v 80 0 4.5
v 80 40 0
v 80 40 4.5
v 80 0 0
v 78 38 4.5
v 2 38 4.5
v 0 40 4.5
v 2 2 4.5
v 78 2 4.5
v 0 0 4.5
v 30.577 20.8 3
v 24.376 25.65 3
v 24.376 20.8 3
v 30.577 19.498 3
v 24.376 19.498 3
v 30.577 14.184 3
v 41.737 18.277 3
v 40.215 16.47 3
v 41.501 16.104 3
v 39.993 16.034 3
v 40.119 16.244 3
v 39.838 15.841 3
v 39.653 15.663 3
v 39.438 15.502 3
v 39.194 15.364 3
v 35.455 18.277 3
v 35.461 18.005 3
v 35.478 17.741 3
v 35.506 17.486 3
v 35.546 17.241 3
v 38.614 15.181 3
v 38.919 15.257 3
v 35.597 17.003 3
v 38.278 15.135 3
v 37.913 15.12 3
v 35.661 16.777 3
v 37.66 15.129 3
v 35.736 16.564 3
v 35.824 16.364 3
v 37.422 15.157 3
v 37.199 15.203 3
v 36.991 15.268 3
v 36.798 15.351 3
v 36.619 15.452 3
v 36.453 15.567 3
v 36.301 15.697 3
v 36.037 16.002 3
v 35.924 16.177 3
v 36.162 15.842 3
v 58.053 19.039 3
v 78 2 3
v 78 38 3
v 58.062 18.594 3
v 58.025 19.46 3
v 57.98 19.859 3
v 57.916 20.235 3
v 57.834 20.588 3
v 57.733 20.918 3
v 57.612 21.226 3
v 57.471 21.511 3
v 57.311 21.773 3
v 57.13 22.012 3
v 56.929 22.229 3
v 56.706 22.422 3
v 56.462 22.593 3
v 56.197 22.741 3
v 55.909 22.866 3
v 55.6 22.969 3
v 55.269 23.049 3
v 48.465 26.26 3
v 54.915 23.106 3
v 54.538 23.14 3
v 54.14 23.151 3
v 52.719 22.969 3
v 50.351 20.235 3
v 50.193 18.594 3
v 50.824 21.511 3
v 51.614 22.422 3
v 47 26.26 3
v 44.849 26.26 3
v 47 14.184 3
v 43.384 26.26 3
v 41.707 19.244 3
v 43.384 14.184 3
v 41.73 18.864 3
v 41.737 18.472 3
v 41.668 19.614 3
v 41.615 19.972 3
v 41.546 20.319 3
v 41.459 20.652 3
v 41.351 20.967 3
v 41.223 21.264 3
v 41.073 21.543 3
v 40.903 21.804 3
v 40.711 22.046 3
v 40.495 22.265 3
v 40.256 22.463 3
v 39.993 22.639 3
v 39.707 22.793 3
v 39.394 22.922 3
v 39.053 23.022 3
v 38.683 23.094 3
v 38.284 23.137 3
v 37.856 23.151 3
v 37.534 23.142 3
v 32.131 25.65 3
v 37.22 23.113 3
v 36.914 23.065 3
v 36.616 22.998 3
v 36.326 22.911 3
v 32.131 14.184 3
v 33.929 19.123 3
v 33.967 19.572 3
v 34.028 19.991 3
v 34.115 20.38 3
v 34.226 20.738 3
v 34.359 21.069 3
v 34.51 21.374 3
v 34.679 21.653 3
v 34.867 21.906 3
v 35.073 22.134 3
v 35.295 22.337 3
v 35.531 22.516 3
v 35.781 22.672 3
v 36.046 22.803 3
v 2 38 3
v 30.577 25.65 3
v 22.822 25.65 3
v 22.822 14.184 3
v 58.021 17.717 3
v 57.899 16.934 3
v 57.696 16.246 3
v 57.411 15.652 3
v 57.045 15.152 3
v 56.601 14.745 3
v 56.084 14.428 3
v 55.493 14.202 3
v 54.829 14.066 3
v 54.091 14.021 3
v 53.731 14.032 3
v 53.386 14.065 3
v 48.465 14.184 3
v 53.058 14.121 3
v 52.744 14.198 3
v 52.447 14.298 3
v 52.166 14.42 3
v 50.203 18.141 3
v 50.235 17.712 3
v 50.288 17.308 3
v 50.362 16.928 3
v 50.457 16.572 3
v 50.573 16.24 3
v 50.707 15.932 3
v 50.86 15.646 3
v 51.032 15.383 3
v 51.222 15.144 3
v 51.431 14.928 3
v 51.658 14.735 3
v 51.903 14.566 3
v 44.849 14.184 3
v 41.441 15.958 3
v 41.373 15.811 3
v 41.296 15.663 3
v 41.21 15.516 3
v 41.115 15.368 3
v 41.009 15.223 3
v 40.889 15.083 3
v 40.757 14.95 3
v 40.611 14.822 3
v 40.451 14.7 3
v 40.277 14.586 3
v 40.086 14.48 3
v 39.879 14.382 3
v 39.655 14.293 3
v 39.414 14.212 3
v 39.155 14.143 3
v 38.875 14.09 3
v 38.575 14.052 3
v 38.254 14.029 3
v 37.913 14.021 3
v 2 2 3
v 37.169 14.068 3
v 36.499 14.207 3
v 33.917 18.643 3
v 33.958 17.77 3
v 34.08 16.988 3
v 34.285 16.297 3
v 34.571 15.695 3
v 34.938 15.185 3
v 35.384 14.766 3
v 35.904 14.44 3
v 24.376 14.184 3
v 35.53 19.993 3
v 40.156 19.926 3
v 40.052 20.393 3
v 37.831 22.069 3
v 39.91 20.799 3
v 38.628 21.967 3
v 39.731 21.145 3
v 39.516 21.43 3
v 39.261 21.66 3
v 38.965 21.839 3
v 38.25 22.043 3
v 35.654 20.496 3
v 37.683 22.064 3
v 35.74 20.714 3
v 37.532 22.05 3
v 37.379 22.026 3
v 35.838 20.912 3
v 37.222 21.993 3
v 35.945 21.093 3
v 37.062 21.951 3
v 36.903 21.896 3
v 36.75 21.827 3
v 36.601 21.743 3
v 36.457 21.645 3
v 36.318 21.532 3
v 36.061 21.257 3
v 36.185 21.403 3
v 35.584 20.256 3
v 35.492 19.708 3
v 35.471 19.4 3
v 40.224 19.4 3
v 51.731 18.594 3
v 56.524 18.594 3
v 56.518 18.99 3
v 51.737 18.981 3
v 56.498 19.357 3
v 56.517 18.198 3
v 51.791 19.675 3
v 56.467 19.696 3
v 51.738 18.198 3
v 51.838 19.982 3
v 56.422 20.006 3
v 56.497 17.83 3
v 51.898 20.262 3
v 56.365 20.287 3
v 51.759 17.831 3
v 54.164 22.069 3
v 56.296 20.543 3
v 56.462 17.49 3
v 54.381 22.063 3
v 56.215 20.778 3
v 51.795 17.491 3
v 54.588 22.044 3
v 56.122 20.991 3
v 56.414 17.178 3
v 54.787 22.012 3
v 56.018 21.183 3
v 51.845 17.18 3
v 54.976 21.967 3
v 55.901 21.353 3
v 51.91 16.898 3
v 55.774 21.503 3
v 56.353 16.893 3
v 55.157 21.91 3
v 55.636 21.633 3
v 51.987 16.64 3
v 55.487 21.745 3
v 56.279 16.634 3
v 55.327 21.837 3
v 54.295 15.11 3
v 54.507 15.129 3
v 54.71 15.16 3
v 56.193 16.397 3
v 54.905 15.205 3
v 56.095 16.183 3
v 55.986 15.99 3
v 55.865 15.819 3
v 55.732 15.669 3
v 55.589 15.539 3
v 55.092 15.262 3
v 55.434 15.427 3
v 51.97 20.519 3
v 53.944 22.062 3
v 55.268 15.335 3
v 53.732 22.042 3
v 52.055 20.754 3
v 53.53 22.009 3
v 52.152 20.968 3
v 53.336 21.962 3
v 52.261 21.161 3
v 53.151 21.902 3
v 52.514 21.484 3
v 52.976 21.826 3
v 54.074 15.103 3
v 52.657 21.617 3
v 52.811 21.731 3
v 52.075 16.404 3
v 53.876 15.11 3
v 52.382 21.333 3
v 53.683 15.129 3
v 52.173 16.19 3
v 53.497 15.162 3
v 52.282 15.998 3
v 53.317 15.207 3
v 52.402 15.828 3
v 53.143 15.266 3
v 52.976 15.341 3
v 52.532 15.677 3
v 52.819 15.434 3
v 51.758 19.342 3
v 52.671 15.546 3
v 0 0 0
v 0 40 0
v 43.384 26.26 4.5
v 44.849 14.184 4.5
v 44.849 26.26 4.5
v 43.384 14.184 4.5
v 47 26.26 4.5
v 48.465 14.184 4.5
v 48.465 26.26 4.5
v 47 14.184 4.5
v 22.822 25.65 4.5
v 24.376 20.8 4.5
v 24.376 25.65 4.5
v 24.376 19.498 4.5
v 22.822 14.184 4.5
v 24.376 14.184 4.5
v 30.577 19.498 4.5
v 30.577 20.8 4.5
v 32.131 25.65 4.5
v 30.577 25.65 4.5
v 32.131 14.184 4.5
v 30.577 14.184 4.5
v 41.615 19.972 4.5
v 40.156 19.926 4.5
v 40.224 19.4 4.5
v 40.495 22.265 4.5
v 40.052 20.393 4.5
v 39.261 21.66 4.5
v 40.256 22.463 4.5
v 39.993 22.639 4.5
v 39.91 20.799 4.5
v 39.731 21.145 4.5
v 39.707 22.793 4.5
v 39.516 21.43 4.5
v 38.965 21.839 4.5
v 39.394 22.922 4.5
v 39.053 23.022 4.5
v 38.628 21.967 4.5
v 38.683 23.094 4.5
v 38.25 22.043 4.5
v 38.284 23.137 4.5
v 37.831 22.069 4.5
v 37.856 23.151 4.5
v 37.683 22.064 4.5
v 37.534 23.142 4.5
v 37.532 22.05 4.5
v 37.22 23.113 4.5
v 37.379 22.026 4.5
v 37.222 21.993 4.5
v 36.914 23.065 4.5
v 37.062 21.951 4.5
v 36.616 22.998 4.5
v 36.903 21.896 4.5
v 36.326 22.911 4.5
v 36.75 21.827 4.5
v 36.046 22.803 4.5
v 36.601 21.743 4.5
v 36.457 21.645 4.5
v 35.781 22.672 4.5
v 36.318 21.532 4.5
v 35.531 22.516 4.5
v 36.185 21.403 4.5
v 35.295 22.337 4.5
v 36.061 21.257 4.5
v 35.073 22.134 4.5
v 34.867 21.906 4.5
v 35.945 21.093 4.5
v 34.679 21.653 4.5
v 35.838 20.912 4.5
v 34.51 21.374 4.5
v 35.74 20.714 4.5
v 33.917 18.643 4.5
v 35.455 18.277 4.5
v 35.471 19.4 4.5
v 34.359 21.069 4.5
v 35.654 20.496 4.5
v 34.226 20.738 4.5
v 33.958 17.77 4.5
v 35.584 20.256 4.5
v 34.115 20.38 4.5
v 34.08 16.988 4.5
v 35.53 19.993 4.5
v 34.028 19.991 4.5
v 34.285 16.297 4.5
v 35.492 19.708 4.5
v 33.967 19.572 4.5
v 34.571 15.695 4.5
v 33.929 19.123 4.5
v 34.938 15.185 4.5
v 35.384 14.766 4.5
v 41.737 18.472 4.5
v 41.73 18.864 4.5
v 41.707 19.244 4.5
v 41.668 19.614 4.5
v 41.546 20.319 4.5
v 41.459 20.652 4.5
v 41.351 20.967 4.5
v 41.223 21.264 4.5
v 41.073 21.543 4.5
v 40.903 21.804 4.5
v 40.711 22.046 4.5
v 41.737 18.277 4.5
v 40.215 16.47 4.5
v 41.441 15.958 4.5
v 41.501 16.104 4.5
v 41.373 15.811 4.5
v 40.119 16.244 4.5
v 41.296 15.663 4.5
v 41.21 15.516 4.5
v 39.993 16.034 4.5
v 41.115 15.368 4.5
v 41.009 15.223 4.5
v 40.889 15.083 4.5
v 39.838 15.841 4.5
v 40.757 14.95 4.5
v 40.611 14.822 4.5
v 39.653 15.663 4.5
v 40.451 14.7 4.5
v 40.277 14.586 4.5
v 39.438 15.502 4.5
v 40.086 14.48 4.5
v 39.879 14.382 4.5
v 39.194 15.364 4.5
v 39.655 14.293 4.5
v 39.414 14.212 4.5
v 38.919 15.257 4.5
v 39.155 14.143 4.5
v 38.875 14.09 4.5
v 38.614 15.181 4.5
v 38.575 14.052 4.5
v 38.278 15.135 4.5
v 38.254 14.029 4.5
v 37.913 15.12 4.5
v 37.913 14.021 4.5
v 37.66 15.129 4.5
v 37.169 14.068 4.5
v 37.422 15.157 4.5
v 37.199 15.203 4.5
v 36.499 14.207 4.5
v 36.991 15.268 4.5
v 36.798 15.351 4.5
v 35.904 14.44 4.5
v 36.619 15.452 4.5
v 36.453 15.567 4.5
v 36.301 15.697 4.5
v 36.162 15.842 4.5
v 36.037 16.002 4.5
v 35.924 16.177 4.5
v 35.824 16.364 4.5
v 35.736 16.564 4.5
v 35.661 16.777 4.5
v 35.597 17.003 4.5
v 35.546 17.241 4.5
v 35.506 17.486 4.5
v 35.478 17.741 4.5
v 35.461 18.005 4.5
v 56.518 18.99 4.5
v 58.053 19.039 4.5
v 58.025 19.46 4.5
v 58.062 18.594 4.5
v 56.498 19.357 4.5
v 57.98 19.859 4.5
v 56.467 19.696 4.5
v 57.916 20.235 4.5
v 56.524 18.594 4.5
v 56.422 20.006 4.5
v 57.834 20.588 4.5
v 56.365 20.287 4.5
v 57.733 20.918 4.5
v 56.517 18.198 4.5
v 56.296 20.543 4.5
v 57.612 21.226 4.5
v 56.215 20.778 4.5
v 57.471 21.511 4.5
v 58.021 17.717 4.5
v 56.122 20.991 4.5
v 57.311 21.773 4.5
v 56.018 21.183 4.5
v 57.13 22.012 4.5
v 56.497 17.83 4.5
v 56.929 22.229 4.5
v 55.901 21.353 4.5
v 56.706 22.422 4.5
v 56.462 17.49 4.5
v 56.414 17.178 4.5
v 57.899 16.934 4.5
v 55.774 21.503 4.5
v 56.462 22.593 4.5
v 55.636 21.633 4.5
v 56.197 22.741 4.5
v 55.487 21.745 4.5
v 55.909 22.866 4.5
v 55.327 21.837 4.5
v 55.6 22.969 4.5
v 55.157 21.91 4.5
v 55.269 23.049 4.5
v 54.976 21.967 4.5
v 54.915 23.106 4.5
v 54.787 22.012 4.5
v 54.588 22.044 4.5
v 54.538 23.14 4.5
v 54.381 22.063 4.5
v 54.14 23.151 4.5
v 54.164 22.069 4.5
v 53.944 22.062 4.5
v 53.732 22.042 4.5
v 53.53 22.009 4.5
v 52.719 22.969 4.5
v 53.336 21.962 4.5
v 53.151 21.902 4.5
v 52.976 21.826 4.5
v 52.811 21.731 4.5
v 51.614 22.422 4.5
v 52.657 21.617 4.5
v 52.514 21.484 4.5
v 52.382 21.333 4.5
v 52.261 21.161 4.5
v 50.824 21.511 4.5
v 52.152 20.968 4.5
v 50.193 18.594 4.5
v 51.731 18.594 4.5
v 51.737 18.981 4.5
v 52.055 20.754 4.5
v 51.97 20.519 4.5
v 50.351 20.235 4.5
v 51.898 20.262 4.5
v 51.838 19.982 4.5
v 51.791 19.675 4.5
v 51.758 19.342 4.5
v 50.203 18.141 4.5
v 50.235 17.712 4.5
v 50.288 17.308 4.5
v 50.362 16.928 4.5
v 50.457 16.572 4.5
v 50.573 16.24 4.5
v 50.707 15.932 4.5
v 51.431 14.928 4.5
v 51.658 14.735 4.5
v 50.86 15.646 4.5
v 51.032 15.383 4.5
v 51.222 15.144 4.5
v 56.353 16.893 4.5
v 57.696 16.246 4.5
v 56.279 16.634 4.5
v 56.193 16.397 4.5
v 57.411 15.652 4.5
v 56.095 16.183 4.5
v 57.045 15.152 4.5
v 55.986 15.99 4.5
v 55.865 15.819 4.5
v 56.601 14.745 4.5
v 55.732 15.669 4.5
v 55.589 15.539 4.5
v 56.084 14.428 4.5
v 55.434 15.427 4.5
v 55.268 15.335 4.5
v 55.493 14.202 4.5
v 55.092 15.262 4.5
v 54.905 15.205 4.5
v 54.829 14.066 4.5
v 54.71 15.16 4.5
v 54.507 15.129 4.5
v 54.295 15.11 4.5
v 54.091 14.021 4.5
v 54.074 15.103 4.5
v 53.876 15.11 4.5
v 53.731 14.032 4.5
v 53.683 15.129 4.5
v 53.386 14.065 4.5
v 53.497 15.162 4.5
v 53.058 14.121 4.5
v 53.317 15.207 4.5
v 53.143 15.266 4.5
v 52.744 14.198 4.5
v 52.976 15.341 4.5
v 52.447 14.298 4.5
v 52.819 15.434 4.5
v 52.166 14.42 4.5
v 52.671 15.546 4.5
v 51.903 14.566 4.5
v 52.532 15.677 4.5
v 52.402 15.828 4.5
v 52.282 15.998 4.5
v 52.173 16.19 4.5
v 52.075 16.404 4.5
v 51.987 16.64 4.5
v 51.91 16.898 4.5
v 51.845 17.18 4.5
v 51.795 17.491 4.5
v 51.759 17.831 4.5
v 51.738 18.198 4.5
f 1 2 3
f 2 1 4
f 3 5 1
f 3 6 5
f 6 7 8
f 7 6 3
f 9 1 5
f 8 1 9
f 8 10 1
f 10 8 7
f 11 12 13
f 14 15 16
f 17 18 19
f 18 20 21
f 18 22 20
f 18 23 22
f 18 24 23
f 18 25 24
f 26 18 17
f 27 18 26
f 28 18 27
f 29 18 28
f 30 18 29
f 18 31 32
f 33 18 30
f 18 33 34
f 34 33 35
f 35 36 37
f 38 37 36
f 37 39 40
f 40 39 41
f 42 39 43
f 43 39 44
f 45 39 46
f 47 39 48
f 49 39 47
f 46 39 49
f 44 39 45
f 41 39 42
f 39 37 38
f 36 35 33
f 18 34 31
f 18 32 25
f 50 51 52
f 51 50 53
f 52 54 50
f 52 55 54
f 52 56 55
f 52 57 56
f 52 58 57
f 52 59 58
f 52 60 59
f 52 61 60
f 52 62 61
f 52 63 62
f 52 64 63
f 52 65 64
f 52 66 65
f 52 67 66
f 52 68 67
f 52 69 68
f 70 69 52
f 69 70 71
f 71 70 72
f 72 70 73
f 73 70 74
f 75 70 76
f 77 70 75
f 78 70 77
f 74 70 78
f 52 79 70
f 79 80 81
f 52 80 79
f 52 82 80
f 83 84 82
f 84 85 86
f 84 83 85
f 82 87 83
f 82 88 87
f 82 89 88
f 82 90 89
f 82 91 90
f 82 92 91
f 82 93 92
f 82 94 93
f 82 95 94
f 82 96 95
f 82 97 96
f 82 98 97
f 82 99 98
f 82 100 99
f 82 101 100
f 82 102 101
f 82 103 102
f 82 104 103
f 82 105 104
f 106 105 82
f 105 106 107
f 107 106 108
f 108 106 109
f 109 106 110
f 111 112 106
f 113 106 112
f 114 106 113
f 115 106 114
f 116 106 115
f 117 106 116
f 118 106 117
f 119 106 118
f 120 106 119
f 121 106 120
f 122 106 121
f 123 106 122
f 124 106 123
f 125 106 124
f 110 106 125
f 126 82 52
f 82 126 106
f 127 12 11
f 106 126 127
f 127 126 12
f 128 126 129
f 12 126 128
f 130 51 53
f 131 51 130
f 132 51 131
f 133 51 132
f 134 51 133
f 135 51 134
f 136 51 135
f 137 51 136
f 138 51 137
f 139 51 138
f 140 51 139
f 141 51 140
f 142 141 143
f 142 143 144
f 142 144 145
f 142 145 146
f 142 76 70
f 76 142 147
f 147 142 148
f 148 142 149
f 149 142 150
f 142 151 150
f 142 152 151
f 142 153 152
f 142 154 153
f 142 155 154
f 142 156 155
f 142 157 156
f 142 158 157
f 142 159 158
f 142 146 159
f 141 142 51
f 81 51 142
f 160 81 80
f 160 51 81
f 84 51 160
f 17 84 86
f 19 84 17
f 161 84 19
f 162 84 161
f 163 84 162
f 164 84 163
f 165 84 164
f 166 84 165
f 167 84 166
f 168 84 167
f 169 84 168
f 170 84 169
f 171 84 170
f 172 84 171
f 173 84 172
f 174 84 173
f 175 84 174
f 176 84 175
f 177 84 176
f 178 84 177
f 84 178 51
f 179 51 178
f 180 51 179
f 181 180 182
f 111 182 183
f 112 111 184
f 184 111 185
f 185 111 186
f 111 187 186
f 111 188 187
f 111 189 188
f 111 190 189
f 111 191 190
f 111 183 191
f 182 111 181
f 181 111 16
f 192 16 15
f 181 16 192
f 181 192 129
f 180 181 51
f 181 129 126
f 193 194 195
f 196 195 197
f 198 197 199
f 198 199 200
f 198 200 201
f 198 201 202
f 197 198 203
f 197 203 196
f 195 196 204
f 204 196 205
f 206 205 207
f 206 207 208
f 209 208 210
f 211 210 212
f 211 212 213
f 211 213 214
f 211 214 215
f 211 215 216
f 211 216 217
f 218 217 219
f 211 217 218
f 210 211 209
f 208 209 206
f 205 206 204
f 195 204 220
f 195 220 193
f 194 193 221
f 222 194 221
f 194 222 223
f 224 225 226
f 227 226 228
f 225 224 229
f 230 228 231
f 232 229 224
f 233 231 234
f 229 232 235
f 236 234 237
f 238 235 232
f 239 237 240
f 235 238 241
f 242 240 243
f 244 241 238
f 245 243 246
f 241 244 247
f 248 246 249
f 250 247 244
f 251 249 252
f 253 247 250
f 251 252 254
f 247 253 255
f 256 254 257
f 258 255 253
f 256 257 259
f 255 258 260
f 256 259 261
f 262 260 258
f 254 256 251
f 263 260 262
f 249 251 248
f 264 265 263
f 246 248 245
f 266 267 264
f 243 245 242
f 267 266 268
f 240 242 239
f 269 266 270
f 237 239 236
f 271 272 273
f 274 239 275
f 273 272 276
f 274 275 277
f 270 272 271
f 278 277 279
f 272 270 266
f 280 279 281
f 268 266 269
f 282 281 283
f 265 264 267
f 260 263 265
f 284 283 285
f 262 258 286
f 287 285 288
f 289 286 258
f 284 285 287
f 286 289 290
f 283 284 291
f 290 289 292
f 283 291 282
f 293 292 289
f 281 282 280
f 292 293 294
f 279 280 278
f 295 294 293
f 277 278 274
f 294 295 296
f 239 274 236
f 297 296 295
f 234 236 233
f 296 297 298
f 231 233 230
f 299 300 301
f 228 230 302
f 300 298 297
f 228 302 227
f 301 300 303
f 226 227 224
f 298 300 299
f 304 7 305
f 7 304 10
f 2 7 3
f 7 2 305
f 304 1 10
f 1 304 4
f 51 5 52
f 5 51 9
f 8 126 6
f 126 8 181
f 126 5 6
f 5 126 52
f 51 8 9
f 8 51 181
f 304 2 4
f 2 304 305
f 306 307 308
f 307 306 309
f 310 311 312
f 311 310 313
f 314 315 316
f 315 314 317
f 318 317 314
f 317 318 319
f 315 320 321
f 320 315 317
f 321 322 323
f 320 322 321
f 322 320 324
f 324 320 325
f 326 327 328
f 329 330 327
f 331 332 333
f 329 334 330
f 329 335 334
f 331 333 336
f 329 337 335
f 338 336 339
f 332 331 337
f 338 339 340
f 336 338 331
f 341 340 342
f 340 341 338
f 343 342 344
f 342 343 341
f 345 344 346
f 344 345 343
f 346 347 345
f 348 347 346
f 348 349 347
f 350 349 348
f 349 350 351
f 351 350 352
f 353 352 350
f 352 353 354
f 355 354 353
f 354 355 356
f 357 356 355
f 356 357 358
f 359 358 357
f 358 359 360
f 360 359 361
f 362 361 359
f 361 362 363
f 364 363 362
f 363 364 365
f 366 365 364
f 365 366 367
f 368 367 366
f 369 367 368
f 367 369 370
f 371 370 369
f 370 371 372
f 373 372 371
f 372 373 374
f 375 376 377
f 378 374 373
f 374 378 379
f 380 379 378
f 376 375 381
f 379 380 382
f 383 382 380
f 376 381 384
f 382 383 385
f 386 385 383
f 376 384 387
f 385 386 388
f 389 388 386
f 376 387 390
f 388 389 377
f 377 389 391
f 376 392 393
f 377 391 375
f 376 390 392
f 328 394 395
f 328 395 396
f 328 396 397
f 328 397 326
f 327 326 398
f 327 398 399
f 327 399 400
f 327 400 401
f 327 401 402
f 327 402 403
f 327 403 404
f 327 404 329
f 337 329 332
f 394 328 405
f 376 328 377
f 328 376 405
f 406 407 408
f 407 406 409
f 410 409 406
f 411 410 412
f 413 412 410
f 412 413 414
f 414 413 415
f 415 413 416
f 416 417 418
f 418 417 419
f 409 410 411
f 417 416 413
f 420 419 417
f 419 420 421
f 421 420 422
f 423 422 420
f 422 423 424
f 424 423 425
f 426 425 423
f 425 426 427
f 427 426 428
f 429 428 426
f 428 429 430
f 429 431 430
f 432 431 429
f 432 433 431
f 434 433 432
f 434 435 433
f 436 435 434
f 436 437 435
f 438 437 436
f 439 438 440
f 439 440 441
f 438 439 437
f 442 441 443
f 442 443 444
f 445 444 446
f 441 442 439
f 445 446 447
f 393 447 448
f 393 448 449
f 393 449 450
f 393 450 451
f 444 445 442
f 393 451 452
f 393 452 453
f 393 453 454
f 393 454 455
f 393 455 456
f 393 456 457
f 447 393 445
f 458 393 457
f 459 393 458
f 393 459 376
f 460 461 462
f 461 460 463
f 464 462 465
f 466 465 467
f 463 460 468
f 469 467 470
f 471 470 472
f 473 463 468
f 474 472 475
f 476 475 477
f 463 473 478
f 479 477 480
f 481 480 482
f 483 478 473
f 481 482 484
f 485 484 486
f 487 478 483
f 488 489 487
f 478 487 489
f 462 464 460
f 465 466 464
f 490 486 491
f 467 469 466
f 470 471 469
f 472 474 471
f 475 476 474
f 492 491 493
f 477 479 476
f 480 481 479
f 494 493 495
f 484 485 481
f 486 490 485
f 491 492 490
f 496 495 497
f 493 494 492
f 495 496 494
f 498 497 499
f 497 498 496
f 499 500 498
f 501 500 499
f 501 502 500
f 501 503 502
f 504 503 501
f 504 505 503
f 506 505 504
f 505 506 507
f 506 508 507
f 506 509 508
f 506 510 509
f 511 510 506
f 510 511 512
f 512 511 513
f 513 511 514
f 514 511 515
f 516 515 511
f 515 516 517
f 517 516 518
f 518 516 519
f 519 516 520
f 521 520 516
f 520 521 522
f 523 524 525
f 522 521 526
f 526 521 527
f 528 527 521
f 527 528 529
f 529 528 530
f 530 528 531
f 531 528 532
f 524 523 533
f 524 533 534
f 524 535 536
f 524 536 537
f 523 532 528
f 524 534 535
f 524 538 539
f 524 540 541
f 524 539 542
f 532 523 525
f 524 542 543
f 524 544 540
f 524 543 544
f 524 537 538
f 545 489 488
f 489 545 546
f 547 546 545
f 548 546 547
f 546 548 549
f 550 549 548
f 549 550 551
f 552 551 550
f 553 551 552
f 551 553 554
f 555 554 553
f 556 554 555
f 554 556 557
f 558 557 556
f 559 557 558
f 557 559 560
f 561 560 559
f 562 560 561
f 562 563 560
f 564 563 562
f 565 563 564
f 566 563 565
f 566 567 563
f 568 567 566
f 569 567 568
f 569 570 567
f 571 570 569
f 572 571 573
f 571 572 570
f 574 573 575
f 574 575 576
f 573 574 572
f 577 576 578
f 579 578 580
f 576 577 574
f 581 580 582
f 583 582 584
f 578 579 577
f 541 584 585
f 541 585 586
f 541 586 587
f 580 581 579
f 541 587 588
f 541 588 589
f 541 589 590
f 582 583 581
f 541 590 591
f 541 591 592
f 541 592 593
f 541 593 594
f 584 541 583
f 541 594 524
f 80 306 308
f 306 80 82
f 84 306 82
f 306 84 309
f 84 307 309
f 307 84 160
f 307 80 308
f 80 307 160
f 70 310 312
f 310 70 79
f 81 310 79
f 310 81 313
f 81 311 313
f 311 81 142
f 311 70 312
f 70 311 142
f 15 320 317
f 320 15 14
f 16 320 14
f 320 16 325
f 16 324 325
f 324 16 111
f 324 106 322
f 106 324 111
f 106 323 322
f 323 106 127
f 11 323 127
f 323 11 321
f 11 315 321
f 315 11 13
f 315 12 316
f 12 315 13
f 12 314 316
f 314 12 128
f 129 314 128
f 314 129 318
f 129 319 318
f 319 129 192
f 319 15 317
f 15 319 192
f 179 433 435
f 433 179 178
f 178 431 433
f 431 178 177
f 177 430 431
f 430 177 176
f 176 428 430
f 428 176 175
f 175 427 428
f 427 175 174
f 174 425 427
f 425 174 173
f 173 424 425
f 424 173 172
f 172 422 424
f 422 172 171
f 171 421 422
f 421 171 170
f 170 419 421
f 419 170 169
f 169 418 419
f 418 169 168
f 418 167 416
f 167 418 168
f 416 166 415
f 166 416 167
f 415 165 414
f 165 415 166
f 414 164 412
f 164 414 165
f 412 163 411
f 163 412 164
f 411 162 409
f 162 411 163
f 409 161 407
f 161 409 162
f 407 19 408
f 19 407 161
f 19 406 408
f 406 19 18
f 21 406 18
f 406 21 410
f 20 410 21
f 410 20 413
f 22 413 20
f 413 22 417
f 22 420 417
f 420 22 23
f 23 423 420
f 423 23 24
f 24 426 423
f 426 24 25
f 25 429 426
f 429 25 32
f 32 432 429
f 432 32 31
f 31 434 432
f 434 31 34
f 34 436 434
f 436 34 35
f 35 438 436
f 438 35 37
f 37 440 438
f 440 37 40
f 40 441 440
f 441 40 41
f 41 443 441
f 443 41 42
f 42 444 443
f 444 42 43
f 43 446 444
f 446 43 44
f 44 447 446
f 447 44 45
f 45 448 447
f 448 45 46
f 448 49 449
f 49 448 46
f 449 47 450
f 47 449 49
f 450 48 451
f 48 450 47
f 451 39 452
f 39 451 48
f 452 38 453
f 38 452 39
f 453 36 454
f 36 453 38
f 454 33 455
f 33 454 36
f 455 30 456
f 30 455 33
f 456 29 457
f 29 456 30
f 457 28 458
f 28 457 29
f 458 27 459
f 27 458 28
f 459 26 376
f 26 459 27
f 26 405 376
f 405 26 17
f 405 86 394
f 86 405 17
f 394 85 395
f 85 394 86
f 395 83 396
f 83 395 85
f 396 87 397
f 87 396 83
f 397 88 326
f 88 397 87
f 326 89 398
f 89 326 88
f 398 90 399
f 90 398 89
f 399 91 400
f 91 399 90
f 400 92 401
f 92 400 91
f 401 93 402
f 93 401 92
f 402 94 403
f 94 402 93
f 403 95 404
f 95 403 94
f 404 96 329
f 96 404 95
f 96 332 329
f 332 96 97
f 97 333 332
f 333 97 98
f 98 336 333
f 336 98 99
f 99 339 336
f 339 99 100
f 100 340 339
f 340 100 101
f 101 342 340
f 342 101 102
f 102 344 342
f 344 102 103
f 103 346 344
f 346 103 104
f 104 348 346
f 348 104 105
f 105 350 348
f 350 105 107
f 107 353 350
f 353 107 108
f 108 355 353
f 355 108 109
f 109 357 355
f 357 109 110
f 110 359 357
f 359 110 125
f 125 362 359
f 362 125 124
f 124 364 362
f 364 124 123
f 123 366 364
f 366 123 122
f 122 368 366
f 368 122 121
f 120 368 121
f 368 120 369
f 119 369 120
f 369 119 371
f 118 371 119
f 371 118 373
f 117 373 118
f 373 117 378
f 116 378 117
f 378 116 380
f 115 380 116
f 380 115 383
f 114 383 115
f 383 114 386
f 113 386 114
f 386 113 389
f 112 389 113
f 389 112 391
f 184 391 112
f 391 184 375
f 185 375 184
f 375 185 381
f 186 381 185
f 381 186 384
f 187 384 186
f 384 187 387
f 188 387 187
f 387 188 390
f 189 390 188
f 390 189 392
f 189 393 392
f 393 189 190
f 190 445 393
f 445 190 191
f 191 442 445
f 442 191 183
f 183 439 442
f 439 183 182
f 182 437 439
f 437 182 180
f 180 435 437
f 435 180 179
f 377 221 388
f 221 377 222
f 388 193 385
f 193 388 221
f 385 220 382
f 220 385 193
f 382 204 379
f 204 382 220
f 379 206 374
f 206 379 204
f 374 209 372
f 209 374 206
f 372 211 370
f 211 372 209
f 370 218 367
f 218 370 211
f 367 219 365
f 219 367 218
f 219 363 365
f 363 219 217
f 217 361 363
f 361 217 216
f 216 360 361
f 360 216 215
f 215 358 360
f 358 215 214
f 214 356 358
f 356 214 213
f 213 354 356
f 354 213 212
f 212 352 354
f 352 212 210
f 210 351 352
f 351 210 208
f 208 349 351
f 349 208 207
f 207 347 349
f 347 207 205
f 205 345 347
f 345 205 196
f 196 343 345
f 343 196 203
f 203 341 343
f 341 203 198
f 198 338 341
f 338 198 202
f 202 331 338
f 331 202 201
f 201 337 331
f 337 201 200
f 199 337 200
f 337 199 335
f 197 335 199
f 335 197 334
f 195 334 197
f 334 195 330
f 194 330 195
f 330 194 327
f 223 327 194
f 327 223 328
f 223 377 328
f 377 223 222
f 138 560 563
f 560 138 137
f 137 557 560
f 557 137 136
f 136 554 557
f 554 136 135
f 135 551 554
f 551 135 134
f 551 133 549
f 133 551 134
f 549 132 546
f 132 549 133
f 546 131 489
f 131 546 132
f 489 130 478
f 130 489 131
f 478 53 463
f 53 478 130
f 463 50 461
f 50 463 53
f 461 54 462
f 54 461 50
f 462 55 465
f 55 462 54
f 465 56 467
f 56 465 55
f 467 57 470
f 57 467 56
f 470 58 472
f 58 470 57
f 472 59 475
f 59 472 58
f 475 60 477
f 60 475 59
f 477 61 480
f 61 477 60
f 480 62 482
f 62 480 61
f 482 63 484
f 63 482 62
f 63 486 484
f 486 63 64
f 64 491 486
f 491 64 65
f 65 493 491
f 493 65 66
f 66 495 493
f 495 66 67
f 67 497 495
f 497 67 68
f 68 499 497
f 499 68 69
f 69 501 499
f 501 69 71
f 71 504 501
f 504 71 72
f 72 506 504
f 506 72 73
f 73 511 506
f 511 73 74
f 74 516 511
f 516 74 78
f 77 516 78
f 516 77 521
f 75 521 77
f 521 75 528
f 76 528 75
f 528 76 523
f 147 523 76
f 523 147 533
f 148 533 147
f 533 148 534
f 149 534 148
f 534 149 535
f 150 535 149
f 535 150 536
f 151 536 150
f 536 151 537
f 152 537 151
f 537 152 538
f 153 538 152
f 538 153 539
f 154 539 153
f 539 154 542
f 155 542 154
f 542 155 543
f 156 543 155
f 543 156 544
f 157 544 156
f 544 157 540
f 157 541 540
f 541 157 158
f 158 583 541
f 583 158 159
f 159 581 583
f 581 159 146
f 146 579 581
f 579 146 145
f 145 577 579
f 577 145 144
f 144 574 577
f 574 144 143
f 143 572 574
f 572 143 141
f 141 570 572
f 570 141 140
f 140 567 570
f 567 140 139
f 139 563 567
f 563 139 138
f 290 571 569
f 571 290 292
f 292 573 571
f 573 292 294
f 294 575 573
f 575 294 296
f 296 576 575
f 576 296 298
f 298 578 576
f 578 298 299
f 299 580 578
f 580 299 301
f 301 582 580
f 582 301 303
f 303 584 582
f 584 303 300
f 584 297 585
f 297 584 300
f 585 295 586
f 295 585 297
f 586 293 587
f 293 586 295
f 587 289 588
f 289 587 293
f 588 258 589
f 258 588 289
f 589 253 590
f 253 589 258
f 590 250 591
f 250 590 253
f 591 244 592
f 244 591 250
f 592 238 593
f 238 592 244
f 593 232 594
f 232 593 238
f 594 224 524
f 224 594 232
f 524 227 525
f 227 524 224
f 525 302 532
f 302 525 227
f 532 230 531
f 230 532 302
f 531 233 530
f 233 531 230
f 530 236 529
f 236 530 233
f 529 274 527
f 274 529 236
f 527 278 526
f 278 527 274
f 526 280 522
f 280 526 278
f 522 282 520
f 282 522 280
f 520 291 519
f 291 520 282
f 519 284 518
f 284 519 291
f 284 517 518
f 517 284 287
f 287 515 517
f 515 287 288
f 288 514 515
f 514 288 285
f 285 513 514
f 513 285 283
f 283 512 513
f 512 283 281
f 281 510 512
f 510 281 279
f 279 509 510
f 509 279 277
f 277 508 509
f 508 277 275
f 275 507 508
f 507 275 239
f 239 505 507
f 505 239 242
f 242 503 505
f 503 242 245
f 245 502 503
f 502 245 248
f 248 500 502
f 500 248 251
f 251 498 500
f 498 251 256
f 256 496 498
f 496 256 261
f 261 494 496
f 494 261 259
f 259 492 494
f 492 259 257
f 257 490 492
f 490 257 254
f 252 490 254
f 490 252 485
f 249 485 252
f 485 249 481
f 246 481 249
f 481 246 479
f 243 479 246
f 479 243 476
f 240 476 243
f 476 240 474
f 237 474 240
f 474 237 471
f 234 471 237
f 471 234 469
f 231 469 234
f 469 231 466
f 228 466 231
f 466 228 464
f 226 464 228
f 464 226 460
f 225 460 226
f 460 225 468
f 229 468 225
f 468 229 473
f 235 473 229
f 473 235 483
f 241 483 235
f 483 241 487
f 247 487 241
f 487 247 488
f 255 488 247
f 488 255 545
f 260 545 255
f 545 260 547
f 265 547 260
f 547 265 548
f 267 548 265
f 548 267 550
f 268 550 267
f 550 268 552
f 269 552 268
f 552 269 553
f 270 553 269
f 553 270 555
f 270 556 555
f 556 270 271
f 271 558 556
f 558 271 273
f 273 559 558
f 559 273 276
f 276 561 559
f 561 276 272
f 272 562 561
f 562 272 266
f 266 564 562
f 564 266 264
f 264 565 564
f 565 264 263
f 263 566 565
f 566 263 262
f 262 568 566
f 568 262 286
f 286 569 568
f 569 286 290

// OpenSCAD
// Yantra4D wrapper — Sign with Border
// Larger plate with decorative border frame and text

message = "Hello";
font_size = 12;
text_depth = 1.5;
base_width = 80;
base_height = 40;
base_thickness = 3;
raised = true;
border_width = 2;
fn = 0;
render_mode = 0;

$fn = fn > 0 ? fn : 32;

module sign_base() {
    cube([base_width, base_height, base_thickness]);
}

module border_frame() {
    // Raised border around the edge
    difference() {
        cube([base_width, base_height, text_depth]);
        translate([border_width, border_width, -0.1])
            cube([base_width - border_width * 2,
                  base_height - border_width * 2,
                  text_depth + 0.2]);
    }
}

if (raised) {
    union() {
        sign_base();
        // Border frame on top
        translate([0, 0, base_thickness])
            border_frame();
        // Raised text
        translate([base_width / 2, base_height / 2, base_thickness])
            linear_extrude(text_depth)
                text(message, size = font_size, halign = "center", valign = "center");
    }
} else {
    difference() {
        union() {
            sign_base();
            // Border frame on top
            translate([0, 0, base_thickness])
                border_frame();
        }
        // Inset text
        translate([base_width / 2, base_height / 2, base_thickness - text_depth])
            linear_extrude(text_depth + 0.1)
                text(message, size = font_size, halign = "center", valign = "center");
    }
}
